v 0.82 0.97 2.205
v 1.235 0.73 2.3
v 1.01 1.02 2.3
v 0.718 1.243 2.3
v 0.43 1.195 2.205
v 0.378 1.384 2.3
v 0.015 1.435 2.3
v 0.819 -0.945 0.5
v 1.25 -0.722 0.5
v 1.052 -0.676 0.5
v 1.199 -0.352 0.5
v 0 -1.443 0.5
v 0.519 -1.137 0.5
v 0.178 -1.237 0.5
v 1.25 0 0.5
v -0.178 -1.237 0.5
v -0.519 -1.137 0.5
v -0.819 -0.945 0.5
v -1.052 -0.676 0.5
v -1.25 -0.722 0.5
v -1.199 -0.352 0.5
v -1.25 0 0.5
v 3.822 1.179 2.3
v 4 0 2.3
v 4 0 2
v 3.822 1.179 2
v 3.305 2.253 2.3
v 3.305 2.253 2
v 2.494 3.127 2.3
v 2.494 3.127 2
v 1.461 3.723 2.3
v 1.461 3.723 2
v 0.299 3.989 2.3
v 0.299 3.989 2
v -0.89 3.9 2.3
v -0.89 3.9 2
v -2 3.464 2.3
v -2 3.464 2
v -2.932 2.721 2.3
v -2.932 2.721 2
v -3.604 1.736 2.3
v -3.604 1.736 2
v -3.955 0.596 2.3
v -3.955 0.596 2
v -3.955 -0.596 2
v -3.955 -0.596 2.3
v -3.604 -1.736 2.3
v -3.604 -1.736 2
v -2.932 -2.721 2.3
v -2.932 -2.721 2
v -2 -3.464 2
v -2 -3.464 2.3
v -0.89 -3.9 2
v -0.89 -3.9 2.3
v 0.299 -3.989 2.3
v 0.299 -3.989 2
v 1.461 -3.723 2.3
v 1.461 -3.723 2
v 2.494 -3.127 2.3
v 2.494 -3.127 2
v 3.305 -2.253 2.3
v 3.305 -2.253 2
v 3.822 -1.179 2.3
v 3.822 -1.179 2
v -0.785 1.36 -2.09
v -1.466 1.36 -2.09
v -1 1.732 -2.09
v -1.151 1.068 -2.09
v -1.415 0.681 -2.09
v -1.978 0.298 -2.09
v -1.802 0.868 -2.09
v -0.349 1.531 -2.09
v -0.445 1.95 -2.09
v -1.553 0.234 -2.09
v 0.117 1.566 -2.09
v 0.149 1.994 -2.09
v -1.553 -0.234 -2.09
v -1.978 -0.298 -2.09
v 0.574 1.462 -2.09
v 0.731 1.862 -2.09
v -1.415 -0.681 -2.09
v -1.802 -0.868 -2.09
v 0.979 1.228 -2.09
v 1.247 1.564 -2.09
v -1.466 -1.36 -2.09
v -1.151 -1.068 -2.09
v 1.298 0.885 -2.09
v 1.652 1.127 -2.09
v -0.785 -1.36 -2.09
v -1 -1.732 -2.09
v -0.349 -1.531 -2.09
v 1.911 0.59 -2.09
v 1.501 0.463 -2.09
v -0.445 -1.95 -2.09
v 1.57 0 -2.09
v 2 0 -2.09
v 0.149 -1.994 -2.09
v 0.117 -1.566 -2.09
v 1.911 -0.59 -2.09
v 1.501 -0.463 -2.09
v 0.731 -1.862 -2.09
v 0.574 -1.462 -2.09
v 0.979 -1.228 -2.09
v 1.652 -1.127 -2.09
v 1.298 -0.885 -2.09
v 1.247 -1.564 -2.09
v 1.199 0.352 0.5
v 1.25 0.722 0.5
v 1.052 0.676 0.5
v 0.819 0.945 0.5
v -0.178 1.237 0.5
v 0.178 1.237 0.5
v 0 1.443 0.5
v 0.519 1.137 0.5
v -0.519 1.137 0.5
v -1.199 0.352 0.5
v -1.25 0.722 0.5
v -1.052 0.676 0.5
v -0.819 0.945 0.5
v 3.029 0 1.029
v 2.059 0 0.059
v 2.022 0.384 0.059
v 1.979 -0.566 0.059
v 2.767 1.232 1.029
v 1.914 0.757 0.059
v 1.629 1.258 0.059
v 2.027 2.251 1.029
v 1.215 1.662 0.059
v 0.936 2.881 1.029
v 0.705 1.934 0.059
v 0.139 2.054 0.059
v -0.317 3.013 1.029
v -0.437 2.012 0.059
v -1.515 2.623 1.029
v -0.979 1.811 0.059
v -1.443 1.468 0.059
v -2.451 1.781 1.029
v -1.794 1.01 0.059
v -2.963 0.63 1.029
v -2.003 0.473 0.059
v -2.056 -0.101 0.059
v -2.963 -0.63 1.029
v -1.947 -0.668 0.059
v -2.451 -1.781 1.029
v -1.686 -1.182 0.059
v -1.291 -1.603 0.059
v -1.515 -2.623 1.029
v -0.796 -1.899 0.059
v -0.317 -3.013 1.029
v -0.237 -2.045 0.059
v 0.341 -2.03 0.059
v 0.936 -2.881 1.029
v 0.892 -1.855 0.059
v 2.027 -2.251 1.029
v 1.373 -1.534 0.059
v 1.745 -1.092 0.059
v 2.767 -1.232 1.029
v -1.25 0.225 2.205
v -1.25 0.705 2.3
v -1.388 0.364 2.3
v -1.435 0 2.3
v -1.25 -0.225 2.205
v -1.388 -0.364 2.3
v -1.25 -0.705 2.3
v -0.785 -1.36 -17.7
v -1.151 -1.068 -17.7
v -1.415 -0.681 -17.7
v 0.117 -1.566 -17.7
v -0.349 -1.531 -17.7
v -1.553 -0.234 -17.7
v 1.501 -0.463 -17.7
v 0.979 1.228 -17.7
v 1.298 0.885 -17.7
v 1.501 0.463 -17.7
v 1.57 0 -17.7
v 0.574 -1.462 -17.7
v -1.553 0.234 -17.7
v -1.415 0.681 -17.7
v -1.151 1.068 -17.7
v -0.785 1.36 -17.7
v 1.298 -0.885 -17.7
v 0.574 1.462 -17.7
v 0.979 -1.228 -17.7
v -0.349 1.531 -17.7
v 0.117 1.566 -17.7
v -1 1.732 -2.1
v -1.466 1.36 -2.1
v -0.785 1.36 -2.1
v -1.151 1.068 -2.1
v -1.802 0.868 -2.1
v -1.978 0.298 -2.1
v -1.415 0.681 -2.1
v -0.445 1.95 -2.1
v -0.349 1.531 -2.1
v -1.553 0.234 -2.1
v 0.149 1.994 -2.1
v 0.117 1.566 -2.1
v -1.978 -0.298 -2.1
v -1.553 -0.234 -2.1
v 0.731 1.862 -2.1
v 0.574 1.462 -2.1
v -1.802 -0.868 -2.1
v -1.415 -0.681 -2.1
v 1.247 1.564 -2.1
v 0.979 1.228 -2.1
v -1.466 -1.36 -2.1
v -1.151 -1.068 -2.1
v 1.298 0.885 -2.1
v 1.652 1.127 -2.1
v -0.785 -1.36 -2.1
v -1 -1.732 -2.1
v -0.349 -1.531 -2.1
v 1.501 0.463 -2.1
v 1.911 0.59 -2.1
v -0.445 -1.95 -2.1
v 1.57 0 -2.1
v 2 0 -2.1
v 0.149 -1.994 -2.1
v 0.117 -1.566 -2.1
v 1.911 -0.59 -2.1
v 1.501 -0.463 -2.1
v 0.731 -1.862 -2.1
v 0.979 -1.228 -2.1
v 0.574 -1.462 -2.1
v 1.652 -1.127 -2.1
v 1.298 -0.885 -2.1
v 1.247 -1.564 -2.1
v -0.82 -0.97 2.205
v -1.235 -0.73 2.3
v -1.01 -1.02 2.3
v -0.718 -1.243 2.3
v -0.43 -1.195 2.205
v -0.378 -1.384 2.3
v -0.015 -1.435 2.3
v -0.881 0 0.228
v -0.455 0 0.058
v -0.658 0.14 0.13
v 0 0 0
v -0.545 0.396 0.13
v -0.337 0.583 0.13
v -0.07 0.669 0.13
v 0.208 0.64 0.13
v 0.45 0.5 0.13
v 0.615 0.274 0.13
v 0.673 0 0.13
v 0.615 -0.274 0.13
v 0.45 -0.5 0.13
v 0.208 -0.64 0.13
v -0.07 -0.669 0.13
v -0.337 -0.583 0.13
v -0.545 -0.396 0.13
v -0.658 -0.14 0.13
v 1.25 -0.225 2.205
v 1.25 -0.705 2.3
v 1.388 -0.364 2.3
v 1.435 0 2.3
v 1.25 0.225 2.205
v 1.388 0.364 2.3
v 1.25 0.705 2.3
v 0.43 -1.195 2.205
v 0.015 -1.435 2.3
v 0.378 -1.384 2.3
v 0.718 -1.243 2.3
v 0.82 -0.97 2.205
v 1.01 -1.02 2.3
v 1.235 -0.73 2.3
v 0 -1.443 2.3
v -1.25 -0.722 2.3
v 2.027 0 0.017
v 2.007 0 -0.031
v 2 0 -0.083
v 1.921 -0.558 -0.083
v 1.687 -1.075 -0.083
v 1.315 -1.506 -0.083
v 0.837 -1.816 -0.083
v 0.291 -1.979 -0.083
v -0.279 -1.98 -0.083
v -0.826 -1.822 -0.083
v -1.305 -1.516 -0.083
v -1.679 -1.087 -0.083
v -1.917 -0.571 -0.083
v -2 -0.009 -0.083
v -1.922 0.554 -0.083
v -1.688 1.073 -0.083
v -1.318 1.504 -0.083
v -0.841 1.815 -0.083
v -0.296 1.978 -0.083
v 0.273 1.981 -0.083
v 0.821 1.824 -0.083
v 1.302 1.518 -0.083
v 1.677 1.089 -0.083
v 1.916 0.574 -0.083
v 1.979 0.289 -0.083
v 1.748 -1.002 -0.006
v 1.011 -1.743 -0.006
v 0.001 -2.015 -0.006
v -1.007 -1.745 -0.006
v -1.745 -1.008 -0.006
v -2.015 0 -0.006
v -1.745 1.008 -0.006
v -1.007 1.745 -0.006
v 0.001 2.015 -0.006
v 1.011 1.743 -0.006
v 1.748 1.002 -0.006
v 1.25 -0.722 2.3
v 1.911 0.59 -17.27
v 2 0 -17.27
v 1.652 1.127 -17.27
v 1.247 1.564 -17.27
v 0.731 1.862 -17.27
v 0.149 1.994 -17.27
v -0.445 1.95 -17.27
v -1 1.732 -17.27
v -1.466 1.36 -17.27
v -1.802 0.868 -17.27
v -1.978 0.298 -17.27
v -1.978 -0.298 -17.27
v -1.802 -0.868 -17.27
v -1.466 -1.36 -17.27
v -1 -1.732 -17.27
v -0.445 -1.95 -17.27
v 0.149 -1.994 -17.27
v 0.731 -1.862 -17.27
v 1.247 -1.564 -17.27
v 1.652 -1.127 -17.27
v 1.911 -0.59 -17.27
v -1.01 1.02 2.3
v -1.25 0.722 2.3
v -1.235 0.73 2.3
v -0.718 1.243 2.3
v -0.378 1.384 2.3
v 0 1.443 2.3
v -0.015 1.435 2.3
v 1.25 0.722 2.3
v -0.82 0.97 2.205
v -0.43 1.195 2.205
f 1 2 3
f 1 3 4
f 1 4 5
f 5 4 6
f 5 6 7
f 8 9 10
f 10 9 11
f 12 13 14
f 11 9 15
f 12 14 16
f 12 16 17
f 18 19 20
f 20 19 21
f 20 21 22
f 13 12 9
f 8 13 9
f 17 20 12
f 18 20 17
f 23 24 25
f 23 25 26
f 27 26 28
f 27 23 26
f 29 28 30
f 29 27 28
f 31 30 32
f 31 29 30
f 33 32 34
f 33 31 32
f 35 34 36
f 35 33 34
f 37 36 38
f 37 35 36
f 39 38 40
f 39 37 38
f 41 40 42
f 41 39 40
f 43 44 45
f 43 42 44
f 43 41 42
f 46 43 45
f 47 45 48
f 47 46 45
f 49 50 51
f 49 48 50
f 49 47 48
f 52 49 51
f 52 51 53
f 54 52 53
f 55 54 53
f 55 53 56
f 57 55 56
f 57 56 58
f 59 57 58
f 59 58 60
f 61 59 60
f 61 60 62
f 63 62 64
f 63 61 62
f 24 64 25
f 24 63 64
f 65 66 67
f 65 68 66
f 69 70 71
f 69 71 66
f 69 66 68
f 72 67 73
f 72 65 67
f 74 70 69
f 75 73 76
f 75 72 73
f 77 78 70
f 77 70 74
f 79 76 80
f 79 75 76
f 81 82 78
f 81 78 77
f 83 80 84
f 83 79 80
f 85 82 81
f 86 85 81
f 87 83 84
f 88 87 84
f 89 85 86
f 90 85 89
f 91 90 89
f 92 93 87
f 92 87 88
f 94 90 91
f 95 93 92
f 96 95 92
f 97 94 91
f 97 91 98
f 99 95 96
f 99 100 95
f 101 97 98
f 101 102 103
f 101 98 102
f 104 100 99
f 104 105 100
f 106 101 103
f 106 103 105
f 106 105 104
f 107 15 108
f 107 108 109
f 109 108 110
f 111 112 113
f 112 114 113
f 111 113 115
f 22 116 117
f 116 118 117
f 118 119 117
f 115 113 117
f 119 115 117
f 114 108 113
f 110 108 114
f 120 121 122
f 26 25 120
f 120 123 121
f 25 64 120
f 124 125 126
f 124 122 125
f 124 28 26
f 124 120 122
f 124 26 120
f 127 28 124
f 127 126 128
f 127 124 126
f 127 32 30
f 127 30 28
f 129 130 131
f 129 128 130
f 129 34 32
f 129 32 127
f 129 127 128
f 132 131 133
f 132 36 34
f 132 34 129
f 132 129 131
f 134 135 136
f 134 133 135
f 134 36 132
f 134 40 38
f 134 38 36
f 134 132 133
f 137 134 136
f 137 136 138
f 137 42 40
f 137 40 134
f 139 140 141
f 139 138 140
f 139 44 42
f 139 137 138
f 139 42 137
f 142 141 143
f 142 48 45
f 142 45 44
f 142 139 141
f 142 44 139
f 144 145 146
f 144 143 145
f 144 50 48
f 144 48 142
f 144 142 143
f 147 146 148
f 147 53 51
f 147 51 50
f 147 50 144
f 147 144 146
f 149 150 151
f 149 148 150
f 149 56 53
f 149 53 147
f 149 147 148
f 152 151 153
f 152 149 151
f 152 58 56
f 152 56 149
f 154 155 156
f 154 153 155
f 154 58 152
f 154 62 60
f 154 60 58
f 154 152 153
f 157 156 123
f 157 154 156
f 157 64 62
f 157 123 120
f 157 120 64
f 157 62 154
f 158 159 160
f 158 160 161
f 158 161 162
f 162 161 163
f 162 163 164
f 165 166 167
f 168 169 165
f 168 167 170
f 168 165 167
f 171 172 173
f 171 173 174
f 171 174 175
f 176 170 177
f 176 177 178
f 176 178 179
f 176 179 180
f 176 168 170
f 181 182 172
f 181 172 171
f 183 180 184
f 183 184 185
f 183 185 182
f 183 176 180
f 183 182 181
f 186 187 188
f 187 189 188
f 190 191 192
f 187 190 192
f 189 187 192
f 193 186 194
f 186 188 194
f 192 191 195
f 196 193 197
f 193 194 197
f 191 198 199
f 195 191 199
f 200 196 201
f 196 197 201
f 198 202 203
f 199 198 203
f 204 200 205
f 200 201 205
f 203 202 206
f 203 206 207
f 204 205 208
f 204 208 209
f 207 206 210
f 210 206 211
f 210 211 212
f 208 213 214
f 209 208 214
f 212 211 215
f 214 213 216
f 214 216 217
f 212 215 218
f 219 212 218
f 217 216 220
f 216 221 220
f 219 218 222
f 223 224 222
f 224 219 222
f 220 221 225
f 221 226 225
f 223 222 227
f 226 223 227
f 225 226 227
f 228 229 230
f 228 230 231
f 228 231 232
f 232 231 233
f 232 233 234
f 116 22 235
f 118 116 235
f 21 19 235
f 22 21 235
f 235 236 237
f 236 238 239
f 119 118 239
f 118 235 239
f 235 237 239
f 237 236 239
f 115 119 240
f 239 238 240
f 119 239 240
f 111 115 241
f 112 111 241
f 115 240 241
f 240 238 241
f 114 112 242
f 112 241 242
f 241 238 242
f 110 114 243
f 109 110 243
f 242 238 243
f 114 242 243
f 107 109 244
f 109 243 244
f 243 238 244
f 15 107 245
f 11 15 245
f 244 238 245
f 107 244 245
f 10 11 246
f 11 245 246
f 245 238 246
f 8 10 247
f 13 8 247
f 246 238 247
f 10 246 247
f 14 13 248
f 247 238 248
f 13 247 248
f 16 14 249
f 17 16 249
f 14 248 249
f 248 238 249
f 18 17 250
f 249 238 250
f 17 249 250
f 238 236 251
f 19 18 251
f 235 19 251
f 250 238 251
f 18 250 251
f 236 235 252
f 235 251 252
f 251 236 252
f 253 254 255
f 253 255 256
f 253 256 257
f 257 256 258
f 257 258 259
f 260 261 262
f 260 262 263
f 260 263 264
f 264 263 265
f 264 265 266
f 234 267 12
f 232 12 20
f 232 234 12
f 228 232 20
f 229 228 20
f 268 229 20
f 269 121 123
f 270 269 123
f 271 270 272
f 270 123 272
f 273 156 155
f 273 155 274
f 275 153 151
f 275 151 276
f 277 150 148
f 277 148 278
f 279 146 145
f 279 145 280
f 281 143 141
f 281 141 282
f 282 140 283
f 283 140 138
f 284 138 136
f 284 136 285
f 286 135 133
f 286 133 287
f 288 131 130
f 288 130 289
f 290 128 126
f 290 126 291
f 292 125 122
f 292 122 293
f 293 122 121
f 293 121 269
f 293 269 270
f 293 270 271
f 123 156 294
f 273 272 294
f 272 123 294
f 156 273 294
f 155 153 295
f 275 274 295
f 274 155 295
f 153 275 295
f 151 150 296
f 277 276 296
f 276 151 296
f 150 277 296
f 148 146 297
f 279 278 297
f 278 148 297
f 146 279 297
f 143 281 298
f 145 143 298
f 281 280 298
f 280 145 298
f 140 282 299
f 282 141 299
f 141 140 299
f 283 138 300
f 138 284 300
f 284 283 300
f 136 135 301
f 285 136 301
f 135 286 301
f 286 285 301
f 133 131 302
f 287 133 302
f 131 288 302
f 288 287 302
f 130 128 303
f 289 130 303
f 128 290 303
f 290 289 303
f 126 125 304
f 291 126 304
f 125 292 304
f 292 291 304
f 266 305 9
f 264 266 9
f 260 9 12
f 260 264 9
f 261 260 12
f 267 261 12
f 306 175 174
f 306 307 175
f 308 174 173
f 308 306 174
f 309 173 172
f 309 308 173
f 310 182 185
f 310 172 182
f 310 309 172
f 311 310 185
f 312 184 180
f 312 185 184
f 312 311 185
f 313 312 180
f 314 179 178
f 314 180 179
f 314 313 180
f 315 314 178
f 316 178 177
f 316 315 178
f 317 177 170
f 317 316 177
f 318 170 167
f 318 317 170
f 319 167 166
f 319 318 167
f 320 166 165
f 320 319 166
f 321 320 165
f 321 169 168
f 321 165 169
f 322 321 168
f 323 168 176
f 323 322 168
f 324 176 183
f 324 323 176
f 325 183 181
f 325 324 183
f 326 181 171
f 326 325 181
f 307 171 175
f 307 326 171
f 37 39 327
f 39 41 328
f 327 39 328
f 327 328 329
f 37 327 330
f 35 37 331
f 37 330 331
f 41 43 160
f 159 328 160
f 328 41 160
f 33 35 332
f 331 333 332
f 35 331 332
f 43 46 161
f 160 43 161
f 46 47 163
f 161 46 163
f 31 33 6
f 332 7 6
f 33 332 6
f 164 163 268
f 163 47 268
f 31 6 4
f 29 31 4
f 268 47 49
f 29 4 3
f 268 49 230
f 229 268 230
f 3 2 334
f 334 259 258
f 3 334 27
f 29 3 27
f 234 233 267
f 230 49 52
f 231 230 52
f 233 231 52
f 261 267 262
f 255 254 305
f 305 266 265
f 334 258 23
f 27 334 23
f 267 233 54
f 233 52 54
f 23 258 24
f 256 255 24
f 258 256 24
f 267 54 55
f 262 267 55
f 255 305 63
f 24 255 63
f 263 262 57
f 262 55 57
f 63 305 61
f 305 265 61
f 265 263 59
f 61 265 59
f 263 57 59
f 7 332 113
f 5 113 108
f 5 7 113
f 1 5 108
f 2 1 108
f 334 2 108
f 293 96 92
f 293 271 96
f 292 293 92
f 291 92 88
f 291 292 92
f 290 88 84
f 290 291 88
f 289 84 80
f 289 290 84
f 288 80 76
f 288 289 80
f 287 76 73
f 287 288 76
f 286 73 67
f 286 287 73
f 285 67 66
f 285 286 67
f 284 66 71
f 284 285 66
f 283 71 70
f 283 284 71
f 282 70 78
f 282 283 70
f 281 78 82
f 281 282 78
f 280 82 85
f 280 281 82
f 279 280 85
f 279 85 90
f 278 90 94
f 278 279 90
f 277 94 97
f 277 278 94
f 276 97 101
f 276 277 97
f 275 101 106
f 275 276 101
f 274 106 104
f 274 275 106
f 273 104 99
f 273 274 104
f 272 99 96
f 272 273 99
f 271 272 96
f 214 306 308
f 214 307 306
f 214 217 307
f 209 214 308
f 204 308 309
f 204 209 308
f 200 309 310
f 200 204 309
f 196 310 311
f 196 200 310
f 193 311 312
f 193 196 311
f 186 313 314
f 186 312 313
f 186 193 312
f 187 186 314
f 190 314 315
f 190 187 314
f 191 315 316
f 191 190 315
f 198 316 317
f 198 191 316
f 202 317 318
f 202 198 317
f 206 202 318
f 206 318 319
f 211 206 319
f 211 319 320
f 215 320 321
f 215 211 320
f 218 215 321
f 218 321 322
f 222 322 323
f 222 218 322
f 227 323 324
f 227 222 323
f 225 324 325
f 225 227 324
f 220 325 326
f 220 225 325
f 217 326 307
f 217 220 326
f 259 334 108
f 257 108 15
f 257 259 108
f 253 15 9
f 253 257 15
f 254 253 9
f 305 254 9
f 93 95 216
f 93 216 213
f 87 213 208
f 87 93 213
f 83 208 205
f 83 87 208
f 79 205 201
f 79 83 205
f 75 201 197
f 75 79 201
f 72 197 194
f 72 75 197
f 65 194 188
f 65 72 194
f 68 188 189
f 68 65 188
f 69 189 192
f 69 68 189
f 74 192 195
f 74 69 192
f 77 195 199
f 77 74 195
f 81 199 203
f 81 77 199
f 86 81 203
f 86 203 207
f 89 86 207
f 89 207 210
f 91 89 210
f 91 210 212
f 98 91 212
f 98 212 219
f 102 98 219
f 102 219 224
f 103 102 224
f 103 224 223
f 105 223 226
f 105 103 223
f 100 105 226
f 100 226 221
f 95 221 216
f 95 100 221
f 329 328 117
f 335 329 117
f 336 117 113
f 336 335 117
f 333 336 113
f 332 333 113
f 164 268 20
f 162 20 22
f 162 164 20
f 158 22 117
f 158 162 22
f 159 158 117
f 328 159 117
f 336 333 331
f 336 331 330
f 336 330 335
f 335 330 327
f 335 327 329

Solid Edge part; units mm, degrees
sketch "Sketch1" plane through (0, 0, 0) normal (0, -1, 0) x (1, 0, 0)
  line L0 (2, 0) -> (4, 2)
  line L1 (4, 2) -> (4, 2.3)
  line L2 (4, 2.3) -> (0, 2.3)
  line L3 (0, 2.3) -> (0, -17.7)
  line L4 (0, -17.7) -> (1.5705, -17.7)
  line L5 (1.5705, -17.7) -> (2, -17.2705)
  line L6 (2, -17.2705) -> (2, -2.1)
  line L7 (2, -2.1) -> (1.5705, -2.1)
  line L8 (1.5705, -2.1) -> (1.5705, -2.09)
  line L9 (1.5705, -2.09) -> (2, -2.09)
  line L10 (2, -2.09) -> (2, 0)
  dimension "D1" = 20
  dimension "D2" = 4
  dimension "D3" = 2.3
  dimension "D4" = 0.01
  dimension "D5" = 1.5705
  dimension "D6" = 4.4
  dimension "D7" = 0.3
revolve "RevolvedProtrusion1" add sketch "Sketch1" angle 360 about axis through (0, 0, 54) along (0, 0, -1)
sketch "Sketch2" plane through (0, 0, 0) normal (0, -1, 0) x (1, 0, 0)
  arc A0 (-1.25, 0.5) -> (0, 0) centre (0, 1.8125) ccw
  line L0 (0, 0.5) -> (0, 0)
  line L1 (-1.25, 0.5) -> (0, 0.5)
  dimension "D1" = 18.2
revolve "RevolvedCutout1" cut sketch "Sketch2" angle 360 about axis through (0, 0, 54) along (0, 0, -1)
sketch "Sketch3" plane through (0, 0, 2.3) normal (0, 0, 1) x (0, -1, 0)
  line L0 (-1.4434, 0) -> (-0.7217, 1.25)
  line L1 (-0.7217, 1.25) -> (0.7217, 1.25)
  line L2 (0.7217, 1.25) -> (1.4434, 0)
  line L3 (1.4434, 0) -> (0.7217, -1.25)
  line L4 (0.7217, -1.25) -> (-0.7217, -1.25)
  line L5 (-0.7217, -1.25) -> (-1.4434, 0)
  dimension "D1" = 2.5
extrude "Cutout1" cut sketch "Sketch3" against normal blind 1.8
cosmetic_thread "Thread1" size "M4"
sketch "Sketch4" plane through (0, 0, 0) normal (1, 0, 0) x (0, 1, 0)
  line L0 (-1.435, 2.3) -> (0, 1.4715)
revolve "RevolvedCutout2" cut sketch "Sketch4" angle 360 about axis through (0, 0, -57) along (0, 0, 1) material side at (0, -0.6925, 1.9291)
fillet "Round1" radius 0.2 1 edges at (-2, 0, 0)
properties material "Stahl"
